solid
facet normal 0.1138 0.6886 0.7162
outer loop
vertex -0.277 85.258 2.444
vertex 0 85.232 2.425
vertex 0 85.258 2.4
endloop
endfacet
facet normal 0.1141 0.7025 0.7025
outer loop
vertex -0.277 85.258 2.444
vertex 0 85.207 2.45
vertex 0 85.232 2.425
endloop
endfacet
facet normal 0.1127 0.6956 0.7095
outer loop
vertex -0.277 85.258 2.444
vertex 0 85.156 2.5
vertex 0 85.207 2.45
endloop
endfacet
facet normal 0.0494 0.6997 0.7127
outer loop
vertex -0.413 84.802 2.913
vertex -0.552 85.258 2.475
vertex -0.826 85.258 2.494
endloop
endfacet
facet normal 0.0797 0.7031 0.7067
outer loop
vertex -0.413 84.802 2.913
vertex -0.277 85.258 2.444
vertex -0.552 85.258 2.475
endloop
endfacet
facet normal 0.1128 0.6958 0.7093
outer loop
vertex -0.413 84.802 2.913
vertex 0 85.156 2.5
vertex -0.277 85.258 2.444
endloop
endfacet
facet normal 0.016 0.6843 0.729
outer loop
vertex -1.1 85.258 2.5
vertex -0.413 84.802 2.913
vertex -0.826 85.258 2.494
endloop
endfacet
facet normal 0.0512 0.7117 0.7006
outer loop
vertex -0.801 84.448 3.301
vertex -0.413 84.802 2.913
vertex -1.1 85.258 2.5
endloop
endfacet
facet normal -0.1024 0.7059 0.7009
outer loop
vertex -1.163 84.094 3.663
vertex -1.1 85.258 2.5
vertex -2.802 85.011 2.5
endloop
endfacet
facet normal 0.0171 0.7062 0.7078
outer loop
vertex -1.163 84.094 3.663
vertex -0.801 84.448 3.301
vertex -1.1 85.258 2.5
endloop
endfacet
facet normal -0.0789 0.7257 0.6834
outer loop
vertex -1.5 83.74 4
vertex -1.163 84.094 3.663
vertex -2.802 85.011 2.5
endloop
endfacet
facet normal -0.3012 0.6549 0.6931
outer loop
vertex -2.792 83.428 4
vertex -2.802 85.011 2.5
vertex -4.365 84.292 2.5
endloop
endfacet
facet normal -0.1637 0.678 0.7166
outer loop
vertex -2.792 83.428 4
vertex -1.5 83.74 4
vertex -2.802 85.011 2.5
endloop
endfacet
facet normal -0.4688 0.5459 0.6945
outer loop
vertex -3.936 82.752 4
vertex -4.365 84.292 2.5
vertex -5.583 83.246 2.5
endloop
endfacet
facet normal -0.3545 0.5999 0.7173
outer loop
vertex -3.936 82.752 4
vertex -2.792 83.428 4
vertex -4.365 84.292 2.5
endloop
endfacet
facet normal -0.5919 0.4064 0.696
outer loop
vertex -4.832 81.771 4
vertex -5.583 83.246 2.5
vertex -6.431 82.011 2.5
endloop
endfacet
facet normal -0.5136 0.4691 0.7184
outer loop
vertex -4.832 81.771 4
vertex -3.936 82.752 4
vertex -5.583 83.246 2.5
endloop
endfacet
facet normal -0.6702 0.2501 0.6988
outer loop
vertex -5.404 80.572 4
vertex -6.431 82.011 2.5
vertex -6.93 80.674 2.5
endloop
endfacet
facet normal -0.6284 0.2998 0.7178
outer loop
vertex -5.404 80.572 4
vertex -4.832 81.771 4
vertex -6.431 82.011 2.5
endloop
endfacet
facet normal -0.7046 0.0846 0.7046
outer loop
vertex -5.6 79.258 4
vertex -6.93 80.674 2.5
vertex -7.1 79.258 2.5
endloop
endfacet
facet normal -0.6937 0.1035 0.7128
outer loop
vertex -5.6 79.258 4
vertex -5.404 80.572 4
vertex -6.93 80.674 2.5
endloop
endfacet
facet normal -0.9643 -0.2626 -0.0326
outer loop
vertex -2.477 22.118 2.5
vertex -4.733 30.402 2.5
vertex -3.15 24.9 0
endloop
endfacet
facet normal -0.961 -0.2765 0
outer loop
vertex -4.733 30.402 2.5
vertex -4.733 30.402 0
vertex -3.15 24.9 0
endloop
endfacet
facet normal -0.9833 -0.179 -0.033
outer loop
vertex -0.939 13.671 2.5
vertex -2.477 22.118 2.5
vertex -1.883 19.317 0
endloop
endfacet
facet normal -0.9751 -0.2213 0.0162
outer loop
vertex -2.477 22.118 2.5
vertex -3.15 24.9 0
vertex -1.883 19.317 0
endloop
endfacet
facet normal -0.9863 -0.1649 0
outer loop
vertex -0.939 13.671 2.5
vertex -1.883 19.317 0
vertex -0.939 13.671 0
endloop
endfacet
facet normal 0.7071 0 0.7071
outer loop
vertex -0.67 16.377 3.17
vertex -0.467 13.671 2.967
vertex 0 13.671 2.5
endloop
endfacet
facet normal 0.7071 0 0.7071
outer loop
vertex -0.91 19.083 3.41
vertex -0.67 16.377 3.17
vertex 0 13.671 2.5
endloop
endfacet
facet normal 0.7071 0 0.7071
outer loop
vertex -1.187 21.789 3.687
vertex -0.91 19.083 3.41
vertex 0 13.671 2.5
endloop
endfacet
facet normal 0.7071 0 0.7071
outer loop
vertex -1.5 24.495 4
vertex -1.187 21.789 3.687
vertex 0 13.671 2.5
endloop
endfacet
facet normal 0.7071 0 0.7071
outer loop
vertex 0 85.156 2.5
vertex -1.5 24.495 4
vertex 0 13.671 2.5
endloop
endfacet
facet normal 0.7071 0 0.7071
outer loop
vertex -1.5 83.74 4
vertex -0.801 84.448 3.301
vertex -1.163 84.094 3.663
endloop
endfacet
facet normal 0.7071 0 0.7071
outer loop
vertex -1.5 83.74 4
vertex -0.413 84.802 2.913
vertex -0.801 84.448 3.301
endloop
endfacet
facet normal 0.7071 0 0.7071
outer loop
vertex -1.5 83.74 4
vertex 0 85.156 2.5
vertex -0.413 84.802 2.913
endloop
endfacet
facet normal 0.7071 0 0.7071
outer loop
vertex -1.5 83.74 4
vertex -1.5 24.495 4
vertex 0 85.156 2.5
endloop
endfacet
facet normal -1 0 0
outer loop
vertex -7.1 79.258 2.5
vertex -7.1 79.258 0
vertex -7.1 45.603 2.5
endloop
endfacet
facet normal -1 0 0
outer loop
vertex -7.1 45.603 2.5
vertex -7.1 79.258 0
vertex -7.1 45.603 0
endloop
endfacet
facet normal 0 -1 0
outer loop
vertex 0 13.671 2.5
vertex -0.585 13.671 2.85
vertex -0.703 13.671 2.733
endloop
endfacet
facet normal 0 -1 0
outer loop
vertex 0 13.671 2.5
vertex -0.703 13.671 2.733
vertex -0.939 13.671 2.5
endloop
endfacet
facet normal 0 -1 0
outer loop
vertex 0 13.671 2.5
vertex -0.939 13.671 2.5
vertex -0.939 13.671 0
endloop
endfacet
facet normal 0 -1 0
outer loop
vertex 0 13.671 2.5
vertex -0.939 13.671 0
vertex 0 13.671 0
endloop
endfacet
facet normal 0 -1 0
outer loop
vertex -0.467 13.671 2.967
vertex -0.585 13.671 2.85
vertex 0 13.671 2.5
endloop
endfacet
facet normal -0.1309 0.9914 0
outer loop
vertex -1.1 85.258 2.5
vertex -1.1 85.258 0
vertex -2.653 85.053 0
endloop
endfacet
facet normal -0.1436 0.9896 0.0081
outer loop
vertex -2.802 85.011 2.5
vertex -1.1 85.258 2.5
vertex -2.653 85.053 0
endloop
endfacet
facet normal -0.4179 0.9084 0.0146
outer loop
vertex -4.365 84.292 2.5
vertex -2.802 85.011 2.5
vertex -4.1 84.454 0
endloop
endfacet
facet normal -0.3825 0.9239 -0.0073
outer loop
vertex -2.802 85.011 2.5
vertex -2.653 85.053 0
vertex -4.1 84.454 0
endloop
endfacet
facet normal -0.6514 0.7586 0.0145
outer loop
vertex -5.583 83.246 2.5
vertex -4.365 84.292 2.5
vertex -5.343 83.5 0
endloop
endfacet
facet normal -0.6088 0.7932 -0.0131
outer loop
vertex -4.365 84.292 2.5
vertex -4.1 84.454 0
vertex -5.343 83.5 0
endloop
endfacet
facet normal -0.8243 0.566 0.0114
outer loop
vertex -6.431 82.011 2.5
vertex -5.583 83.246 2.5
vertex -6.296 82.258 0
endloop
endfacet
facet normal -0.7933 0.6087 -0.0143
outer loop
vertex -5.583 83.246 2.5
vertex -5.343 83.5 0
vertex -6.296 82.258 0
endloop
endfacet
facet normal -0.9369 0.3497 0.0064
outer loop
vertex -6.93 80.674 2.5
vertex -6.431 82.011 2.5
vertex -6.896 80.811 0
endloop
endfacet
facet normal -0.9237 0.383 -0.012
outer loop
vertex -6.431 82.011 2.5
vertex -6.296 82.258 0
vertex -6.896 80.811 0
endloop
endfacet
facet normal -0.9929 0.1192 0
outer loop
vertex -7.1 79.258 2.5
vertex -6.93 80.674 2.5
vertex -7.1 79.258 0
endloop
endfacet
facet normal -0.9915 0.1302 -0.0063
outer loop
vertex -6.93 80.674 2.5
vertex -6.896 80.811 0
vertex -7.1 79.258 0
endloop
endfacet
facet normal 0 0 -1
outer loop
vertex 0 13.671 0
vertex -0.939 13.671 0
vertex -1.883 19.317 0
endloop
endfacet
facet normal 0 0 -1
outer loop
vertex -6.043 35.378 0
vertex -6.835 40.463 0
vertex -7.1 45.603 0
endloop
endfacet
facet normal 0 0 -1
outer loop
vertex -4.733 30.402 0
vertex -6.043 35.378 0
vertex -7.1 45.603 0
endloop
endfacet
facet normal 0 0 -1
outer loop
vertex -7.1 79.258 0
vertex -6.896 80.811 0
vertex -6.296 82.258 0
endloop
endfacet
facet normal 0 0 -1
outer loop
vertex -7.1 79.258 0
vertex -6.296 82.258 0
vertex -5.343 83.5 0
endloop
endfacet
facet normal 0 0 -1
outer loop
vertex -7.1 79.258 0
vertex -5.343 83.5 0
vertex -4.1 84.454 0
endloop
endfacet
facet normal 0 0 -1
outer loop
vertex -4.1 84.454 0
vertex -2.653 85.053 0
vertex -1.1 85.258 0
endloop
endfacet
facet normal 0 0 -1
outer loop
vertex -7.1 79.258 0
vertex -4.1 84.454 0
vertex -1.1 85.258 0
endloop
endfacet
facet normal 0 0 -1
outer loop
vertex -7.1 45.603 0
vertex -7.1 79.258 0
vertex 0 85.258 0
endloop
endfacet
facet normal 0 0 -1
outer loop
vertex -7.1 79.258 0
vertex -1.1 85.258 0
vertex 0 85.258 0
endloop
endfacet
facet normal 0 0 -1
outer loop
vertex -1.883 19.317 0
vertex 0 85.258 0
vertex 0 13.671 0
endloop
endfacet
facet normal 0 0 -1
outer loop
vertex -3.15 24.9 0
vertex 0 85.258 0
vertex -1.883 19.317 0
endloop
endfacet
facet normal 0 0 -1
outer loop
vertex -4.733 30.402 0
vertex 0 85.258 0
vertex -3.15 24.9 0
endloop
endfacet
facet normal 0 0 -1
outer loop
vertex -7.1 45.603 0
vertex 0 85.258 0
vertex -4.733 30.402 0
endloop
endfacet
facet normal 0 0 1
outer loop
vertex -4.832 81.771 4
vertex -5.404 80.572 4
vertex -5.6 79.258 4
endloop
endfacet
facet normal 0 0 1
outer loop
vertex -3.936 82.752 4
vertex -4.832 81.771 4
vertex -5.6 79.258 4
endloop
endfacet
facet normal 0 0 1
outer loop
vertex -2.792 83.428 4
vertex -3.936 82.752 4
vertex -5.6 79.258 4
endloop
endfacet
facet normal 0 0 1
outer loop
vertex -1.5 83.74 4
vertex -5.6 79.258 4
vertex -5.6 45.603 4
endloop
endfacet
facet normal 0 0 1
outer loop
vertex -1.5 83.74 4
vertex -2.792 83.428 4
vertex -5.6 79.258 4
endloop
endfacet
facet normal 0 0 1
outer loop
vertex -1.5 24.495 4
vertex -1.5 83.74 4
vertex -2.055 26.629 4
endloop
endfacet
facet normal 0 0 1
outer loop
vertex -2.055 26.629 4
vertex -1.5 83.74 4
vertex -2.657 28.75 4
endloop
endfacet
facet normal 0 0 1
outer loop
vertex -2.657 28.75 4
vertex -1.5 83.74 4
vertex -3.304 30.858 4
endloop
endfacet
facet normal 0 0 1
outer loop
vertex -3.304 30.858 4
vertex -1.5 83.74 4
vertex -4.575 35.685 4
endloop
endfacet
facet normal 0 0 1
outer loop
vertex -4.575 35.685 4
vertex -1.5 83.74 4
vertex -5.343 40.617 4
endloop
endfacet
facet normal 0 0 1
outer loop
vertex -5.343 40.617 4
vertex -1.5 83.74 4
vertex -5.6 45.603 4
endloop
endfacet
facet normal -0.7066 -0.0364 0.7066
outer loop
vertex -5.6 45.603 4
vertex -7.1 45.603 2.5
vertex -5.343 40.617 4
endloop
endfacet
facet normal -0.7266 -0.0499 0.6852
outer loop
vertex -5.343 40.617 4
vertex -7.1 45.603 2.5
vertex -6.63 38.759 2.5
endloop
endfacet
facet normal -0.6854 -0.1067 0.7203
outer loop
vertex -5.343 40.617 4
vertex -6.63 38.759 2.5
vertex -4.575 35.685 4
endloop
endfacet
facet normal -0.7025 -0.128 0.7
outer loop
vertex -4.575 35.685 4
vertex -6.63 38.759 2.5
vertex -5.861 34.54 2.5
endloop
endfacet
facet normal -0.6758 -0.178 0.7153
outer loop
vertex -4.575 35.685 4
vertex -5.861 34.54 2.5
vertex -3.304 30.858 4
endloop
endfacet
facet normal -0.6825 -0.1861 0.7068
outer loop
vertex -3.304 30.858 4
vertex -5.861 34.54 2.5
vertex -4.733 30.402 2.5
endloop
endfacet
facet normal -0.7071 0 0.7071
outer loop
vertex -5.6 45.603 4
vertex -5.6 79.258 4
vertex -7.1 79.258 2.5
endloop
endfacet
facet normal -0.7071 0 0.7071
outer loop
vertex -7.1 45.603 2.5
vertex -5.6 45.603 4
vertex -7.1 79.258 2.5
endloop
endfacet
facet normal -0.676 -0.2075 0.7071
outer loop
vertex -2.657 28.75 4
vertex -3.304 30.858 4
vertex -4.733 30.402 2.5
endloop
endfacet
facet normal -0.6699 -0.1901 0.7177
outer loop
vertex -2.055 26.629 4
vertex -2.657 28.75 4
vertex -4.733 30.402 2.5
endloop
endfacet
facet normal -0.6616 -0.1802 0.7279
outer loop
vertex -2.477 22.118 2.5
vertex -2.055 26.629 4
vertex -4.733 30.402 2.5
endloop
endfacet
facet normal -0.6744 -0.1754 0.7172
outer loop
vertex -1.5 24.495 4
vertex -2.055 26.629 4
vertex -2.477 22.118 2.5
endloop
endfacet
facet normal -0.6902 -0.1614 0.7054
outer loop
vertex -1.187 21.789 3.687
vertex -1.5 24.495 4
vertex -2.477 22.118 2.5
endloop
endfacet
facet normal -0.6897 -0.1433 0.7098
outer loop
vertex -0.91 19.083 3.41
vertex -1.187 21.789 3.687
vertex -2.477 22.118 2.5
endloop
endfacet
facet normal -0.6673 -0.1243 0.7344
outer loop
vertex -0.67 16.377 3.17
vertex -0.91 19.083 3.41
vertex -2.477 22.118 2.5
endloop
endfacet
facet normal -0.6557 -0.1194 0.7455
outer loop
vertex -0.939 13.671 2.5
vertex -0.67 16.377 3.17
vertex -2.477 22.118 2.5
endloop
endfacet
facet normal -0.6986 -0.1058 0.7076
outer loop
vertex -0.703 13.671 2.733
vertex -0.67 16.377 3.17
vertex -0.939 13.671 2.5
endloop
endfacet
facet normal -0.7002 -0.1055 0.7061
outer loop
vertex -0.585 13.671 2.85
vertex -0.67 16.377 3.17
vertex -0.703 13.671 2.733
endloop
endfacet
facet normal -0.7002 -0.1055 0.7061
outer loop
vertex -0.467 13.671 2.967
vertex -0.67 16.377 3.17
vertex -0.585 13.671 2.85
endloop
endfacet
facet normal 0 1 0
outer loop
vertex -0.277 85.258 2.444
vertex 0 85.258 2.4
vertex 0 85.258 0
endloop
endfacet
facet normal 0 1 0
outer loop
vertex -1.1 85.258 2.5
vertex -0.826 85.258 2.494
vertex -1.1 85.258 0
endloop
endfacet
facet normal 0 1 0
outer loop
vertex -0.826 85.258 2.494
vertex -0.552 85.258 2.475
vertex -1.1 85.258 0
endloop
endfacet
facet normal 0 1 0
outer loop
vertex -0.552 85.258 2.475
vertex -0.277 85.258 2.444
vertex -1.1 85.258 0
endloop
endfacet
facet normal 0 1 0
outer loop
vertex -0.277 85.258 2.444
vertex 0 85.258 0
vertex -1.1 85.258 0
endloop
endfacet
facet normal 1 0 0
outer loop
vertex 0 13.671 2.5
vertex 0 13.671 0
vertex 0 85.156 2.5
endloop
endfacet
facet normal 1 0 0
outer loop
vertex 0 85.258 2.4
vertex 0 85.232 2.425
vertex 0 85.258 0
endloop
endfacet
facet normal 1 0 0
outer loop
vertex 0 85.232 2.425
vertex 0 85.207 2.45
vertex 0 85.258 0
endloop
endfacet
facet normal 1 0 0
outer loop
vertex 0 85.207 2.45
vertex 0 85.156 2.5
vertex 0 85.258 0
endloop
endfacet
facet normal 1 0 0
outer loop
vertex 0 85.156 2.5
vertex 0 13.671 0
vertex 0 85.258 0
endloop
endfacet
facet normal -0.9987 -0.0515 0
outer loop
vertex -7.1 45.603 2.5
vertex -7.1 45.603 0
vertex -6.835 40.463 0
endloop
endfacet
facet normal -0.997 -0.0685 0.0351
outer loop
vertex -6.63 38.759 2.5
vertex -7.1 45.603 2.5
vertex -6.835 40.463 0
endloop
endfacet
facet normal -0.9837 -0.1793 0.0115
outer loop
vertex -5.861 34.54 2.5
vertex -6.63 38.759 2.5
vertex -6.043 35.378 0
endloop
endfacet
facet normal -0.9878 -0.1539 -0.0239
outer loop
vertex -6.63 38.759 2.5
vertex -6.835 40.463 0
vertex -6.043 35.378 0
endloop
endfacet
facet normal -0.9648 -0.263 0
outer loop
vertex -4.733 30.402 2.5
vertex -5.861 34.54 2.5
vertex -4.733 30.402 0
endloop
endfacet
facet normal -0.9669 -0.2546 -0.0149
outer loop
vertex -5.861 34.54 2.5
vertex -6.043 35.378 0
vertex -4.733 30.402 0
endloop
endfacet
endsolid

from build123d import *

# Parameters (mm, degrees)
EXTRUDE_1_DEPTH     = 4
SKETCH_2_W          = 6.166461301
SKETCH_2_H          = 14.966809979
CUT_EXTRUDE_1_DEPTH = 86.646256186
CHAMFER_3_SIZE      = 1.5


with BuildPart() as part:
    # Эскиз1 → Бобышка-Вытянуть1 (new body)
    with BuildSketch(Plane.XY):
        with BuildLine():
            Line((0, 0), (0, 85.257675306))
            Line((0, 85.257675306), (-1.1, 85.257675306))
            ThreePointArc((-1.1, 85.257675306), (-5.342640687, 83.500315993), (-7.1, 79.257675306))
            Line((-7.1, 79.257675306), (-7.1, 45.60252186))
            ThreePointArc((-7.1, 45.60252186), (-6.504790591, 37.910534687), (-4.733333333, 30.40168124))
            ThreePointArc((-4.733333333, 30.40168124), (-1.190418818, 15.383974346), (0, 0))
        make_face()
    extrude(amount=EXTRUDE_1_DEPTH)

    # Эскиз2 → Вырез-Вытянуть1 (cut, through all)
    with BuildSketch(Plane.XY.offset(4)):
        with Locations((-0.950413373, 6.187246753)):
            Rectangle(SKETCH_2_W, SKETCH_2_H)
    extrude(amount=-CUT_EXTRUDE_1_DEPTH, mode=Mode.SUBTRACT)

    # Фаска3
    chamfer_3_edges = [part.edges().sort_by_distance(p)[0] for p in [
        (0, 49.464163524, 4),
    ]]
    chamfer(chamfer_3_edges, length=CHAMFER_3_SIZE)

    # Фаска4
    # the kernel refuses this chamfer: 1.5 mm, written as the material it takes off along each edge
    with BuildSketch(Plane(origin=(-100, 0, 4), x_dir=(0.9526666666666831, 0.30401681240054956, 0), z_dir=(-0.30401681240054956, 0.9526666666666831, 0))) as chamfer_4_piece_1:
        with BuildLine():
            Line((99.681801948, 1.818198052), (101.818198052, -0.318198052))
            Line((101.818198052, -0.318198052), (101.818198052, -0.543198052))
            ThreePointArc((101.818198052, -0.543198052), (100.909099026, -0.225), (100, -0.225))
            Line((100, -0.225), (99.775, 0))
            ThreePointArc((99.775, 0), (99.775, 0.909099026), (99.456801948, 1.818198052))
            Line((99.456801948, 1.818198052), (99.681801948, 1.818198052))
        make_face()
    revolve(axis=Axis((-100, 0, 4), (0, 0, -1)), revolution_arc=10.406622552, mode=Mode.SUBTRACT)
    with BuildSketch(Plane(origin=(-1.1, 79.257675306, 4), x_dir=(0.6462526290472239, 0.7631235414069935, 0), z_dir=(0.7631235414069935, -0.6462526290472239, 0))) as chamfer_4_piece_2:
        with BuildLine():
            Line((6.318198052, -1.818198052), (4.181801948, 0.318198052))
            Line((4.181801948, 0.318198052), (4.181801948, 0.543198052))
            ThreePointArc((4.181801948, 0.543198052), (5.090900974, 0.225), (6, 0.225))
            Line((6, 0.225), (6.225, 0))
            ThreePointArc((6.225, 0), (6.225, -0.909099026), (6.543198052, -1.818198052))
            Line((6.543198052, -1.818198052), (6.318198052, -1.818198052))
        make_face()
    revolve(axis=Axis((-1.1, 79.257675306, 4), (0, 0, 1)), revolution_arc=130.259658386, mode=Mode.SUBTRACT)
    with BuildSketch(Plane(origin=(42.9, 45.60252186, 4), x_dir=(-1, 0, 0), z_dir=(0, 1, 0))) as chamfer_4_piece_3:
        with BuildLine():
            Line((48.181801948, 0.318198052), (50.318198052, -1.818198052))
            Line((50.318198052, -1.818198052), (50.543198052, -1.818198052))
            ThreePointArc((50.543198052, -1.818198052), (50.225, -0.909099026), (50.225, 0))
            Line((50.225, 0), (50, 0.225))
            ThreePointArc((50, 0.225), (49.090900974, 0.225), (48.181801948, 0.543198052))
            Line((48.181801948, 0.543198052), (48.181801948, 0.318198052))
        make_face()
    revolve(axis=Axis((42.9, 45.60252186, 4), (0, 0, 1)), revolution_arc=17.69902277, mode=Mode.SUBTRACT)
    with BuildSketch(Plane(origin=(-7.1, 79.257675306, 4), x_dir=(0.9850292351397438, 0, 0.17238737169529317), z_dir=(0, -1, 0))) as chamfer_4_piece_4:
        with BuildLine():
            Line((1.845831562, 0), (-0.626868767, -1.73612491))
            Line((-0.626868767, -1.73612491), (-0.848500345, -1.697337752))
            ThreePointArc((-0.848500345, -1.697337752), (-0.37834877, -0.856701959), (-0.221631578, 0.038787159))
            Line((-0.221631578, 0.038787159), (0.038787159, 0.221631578))
            ThreePointArc((0.038787159, 0.221631578), (0.934276277, 0.064914386), (1.88461872, 0.221631578))
            Line((1.88461872, 0.221631578), (1.845831562, 0))
        make_face()
    extrude(amount=33.655153446, mode=Mode.SUBTRACT)


solid = part.part
